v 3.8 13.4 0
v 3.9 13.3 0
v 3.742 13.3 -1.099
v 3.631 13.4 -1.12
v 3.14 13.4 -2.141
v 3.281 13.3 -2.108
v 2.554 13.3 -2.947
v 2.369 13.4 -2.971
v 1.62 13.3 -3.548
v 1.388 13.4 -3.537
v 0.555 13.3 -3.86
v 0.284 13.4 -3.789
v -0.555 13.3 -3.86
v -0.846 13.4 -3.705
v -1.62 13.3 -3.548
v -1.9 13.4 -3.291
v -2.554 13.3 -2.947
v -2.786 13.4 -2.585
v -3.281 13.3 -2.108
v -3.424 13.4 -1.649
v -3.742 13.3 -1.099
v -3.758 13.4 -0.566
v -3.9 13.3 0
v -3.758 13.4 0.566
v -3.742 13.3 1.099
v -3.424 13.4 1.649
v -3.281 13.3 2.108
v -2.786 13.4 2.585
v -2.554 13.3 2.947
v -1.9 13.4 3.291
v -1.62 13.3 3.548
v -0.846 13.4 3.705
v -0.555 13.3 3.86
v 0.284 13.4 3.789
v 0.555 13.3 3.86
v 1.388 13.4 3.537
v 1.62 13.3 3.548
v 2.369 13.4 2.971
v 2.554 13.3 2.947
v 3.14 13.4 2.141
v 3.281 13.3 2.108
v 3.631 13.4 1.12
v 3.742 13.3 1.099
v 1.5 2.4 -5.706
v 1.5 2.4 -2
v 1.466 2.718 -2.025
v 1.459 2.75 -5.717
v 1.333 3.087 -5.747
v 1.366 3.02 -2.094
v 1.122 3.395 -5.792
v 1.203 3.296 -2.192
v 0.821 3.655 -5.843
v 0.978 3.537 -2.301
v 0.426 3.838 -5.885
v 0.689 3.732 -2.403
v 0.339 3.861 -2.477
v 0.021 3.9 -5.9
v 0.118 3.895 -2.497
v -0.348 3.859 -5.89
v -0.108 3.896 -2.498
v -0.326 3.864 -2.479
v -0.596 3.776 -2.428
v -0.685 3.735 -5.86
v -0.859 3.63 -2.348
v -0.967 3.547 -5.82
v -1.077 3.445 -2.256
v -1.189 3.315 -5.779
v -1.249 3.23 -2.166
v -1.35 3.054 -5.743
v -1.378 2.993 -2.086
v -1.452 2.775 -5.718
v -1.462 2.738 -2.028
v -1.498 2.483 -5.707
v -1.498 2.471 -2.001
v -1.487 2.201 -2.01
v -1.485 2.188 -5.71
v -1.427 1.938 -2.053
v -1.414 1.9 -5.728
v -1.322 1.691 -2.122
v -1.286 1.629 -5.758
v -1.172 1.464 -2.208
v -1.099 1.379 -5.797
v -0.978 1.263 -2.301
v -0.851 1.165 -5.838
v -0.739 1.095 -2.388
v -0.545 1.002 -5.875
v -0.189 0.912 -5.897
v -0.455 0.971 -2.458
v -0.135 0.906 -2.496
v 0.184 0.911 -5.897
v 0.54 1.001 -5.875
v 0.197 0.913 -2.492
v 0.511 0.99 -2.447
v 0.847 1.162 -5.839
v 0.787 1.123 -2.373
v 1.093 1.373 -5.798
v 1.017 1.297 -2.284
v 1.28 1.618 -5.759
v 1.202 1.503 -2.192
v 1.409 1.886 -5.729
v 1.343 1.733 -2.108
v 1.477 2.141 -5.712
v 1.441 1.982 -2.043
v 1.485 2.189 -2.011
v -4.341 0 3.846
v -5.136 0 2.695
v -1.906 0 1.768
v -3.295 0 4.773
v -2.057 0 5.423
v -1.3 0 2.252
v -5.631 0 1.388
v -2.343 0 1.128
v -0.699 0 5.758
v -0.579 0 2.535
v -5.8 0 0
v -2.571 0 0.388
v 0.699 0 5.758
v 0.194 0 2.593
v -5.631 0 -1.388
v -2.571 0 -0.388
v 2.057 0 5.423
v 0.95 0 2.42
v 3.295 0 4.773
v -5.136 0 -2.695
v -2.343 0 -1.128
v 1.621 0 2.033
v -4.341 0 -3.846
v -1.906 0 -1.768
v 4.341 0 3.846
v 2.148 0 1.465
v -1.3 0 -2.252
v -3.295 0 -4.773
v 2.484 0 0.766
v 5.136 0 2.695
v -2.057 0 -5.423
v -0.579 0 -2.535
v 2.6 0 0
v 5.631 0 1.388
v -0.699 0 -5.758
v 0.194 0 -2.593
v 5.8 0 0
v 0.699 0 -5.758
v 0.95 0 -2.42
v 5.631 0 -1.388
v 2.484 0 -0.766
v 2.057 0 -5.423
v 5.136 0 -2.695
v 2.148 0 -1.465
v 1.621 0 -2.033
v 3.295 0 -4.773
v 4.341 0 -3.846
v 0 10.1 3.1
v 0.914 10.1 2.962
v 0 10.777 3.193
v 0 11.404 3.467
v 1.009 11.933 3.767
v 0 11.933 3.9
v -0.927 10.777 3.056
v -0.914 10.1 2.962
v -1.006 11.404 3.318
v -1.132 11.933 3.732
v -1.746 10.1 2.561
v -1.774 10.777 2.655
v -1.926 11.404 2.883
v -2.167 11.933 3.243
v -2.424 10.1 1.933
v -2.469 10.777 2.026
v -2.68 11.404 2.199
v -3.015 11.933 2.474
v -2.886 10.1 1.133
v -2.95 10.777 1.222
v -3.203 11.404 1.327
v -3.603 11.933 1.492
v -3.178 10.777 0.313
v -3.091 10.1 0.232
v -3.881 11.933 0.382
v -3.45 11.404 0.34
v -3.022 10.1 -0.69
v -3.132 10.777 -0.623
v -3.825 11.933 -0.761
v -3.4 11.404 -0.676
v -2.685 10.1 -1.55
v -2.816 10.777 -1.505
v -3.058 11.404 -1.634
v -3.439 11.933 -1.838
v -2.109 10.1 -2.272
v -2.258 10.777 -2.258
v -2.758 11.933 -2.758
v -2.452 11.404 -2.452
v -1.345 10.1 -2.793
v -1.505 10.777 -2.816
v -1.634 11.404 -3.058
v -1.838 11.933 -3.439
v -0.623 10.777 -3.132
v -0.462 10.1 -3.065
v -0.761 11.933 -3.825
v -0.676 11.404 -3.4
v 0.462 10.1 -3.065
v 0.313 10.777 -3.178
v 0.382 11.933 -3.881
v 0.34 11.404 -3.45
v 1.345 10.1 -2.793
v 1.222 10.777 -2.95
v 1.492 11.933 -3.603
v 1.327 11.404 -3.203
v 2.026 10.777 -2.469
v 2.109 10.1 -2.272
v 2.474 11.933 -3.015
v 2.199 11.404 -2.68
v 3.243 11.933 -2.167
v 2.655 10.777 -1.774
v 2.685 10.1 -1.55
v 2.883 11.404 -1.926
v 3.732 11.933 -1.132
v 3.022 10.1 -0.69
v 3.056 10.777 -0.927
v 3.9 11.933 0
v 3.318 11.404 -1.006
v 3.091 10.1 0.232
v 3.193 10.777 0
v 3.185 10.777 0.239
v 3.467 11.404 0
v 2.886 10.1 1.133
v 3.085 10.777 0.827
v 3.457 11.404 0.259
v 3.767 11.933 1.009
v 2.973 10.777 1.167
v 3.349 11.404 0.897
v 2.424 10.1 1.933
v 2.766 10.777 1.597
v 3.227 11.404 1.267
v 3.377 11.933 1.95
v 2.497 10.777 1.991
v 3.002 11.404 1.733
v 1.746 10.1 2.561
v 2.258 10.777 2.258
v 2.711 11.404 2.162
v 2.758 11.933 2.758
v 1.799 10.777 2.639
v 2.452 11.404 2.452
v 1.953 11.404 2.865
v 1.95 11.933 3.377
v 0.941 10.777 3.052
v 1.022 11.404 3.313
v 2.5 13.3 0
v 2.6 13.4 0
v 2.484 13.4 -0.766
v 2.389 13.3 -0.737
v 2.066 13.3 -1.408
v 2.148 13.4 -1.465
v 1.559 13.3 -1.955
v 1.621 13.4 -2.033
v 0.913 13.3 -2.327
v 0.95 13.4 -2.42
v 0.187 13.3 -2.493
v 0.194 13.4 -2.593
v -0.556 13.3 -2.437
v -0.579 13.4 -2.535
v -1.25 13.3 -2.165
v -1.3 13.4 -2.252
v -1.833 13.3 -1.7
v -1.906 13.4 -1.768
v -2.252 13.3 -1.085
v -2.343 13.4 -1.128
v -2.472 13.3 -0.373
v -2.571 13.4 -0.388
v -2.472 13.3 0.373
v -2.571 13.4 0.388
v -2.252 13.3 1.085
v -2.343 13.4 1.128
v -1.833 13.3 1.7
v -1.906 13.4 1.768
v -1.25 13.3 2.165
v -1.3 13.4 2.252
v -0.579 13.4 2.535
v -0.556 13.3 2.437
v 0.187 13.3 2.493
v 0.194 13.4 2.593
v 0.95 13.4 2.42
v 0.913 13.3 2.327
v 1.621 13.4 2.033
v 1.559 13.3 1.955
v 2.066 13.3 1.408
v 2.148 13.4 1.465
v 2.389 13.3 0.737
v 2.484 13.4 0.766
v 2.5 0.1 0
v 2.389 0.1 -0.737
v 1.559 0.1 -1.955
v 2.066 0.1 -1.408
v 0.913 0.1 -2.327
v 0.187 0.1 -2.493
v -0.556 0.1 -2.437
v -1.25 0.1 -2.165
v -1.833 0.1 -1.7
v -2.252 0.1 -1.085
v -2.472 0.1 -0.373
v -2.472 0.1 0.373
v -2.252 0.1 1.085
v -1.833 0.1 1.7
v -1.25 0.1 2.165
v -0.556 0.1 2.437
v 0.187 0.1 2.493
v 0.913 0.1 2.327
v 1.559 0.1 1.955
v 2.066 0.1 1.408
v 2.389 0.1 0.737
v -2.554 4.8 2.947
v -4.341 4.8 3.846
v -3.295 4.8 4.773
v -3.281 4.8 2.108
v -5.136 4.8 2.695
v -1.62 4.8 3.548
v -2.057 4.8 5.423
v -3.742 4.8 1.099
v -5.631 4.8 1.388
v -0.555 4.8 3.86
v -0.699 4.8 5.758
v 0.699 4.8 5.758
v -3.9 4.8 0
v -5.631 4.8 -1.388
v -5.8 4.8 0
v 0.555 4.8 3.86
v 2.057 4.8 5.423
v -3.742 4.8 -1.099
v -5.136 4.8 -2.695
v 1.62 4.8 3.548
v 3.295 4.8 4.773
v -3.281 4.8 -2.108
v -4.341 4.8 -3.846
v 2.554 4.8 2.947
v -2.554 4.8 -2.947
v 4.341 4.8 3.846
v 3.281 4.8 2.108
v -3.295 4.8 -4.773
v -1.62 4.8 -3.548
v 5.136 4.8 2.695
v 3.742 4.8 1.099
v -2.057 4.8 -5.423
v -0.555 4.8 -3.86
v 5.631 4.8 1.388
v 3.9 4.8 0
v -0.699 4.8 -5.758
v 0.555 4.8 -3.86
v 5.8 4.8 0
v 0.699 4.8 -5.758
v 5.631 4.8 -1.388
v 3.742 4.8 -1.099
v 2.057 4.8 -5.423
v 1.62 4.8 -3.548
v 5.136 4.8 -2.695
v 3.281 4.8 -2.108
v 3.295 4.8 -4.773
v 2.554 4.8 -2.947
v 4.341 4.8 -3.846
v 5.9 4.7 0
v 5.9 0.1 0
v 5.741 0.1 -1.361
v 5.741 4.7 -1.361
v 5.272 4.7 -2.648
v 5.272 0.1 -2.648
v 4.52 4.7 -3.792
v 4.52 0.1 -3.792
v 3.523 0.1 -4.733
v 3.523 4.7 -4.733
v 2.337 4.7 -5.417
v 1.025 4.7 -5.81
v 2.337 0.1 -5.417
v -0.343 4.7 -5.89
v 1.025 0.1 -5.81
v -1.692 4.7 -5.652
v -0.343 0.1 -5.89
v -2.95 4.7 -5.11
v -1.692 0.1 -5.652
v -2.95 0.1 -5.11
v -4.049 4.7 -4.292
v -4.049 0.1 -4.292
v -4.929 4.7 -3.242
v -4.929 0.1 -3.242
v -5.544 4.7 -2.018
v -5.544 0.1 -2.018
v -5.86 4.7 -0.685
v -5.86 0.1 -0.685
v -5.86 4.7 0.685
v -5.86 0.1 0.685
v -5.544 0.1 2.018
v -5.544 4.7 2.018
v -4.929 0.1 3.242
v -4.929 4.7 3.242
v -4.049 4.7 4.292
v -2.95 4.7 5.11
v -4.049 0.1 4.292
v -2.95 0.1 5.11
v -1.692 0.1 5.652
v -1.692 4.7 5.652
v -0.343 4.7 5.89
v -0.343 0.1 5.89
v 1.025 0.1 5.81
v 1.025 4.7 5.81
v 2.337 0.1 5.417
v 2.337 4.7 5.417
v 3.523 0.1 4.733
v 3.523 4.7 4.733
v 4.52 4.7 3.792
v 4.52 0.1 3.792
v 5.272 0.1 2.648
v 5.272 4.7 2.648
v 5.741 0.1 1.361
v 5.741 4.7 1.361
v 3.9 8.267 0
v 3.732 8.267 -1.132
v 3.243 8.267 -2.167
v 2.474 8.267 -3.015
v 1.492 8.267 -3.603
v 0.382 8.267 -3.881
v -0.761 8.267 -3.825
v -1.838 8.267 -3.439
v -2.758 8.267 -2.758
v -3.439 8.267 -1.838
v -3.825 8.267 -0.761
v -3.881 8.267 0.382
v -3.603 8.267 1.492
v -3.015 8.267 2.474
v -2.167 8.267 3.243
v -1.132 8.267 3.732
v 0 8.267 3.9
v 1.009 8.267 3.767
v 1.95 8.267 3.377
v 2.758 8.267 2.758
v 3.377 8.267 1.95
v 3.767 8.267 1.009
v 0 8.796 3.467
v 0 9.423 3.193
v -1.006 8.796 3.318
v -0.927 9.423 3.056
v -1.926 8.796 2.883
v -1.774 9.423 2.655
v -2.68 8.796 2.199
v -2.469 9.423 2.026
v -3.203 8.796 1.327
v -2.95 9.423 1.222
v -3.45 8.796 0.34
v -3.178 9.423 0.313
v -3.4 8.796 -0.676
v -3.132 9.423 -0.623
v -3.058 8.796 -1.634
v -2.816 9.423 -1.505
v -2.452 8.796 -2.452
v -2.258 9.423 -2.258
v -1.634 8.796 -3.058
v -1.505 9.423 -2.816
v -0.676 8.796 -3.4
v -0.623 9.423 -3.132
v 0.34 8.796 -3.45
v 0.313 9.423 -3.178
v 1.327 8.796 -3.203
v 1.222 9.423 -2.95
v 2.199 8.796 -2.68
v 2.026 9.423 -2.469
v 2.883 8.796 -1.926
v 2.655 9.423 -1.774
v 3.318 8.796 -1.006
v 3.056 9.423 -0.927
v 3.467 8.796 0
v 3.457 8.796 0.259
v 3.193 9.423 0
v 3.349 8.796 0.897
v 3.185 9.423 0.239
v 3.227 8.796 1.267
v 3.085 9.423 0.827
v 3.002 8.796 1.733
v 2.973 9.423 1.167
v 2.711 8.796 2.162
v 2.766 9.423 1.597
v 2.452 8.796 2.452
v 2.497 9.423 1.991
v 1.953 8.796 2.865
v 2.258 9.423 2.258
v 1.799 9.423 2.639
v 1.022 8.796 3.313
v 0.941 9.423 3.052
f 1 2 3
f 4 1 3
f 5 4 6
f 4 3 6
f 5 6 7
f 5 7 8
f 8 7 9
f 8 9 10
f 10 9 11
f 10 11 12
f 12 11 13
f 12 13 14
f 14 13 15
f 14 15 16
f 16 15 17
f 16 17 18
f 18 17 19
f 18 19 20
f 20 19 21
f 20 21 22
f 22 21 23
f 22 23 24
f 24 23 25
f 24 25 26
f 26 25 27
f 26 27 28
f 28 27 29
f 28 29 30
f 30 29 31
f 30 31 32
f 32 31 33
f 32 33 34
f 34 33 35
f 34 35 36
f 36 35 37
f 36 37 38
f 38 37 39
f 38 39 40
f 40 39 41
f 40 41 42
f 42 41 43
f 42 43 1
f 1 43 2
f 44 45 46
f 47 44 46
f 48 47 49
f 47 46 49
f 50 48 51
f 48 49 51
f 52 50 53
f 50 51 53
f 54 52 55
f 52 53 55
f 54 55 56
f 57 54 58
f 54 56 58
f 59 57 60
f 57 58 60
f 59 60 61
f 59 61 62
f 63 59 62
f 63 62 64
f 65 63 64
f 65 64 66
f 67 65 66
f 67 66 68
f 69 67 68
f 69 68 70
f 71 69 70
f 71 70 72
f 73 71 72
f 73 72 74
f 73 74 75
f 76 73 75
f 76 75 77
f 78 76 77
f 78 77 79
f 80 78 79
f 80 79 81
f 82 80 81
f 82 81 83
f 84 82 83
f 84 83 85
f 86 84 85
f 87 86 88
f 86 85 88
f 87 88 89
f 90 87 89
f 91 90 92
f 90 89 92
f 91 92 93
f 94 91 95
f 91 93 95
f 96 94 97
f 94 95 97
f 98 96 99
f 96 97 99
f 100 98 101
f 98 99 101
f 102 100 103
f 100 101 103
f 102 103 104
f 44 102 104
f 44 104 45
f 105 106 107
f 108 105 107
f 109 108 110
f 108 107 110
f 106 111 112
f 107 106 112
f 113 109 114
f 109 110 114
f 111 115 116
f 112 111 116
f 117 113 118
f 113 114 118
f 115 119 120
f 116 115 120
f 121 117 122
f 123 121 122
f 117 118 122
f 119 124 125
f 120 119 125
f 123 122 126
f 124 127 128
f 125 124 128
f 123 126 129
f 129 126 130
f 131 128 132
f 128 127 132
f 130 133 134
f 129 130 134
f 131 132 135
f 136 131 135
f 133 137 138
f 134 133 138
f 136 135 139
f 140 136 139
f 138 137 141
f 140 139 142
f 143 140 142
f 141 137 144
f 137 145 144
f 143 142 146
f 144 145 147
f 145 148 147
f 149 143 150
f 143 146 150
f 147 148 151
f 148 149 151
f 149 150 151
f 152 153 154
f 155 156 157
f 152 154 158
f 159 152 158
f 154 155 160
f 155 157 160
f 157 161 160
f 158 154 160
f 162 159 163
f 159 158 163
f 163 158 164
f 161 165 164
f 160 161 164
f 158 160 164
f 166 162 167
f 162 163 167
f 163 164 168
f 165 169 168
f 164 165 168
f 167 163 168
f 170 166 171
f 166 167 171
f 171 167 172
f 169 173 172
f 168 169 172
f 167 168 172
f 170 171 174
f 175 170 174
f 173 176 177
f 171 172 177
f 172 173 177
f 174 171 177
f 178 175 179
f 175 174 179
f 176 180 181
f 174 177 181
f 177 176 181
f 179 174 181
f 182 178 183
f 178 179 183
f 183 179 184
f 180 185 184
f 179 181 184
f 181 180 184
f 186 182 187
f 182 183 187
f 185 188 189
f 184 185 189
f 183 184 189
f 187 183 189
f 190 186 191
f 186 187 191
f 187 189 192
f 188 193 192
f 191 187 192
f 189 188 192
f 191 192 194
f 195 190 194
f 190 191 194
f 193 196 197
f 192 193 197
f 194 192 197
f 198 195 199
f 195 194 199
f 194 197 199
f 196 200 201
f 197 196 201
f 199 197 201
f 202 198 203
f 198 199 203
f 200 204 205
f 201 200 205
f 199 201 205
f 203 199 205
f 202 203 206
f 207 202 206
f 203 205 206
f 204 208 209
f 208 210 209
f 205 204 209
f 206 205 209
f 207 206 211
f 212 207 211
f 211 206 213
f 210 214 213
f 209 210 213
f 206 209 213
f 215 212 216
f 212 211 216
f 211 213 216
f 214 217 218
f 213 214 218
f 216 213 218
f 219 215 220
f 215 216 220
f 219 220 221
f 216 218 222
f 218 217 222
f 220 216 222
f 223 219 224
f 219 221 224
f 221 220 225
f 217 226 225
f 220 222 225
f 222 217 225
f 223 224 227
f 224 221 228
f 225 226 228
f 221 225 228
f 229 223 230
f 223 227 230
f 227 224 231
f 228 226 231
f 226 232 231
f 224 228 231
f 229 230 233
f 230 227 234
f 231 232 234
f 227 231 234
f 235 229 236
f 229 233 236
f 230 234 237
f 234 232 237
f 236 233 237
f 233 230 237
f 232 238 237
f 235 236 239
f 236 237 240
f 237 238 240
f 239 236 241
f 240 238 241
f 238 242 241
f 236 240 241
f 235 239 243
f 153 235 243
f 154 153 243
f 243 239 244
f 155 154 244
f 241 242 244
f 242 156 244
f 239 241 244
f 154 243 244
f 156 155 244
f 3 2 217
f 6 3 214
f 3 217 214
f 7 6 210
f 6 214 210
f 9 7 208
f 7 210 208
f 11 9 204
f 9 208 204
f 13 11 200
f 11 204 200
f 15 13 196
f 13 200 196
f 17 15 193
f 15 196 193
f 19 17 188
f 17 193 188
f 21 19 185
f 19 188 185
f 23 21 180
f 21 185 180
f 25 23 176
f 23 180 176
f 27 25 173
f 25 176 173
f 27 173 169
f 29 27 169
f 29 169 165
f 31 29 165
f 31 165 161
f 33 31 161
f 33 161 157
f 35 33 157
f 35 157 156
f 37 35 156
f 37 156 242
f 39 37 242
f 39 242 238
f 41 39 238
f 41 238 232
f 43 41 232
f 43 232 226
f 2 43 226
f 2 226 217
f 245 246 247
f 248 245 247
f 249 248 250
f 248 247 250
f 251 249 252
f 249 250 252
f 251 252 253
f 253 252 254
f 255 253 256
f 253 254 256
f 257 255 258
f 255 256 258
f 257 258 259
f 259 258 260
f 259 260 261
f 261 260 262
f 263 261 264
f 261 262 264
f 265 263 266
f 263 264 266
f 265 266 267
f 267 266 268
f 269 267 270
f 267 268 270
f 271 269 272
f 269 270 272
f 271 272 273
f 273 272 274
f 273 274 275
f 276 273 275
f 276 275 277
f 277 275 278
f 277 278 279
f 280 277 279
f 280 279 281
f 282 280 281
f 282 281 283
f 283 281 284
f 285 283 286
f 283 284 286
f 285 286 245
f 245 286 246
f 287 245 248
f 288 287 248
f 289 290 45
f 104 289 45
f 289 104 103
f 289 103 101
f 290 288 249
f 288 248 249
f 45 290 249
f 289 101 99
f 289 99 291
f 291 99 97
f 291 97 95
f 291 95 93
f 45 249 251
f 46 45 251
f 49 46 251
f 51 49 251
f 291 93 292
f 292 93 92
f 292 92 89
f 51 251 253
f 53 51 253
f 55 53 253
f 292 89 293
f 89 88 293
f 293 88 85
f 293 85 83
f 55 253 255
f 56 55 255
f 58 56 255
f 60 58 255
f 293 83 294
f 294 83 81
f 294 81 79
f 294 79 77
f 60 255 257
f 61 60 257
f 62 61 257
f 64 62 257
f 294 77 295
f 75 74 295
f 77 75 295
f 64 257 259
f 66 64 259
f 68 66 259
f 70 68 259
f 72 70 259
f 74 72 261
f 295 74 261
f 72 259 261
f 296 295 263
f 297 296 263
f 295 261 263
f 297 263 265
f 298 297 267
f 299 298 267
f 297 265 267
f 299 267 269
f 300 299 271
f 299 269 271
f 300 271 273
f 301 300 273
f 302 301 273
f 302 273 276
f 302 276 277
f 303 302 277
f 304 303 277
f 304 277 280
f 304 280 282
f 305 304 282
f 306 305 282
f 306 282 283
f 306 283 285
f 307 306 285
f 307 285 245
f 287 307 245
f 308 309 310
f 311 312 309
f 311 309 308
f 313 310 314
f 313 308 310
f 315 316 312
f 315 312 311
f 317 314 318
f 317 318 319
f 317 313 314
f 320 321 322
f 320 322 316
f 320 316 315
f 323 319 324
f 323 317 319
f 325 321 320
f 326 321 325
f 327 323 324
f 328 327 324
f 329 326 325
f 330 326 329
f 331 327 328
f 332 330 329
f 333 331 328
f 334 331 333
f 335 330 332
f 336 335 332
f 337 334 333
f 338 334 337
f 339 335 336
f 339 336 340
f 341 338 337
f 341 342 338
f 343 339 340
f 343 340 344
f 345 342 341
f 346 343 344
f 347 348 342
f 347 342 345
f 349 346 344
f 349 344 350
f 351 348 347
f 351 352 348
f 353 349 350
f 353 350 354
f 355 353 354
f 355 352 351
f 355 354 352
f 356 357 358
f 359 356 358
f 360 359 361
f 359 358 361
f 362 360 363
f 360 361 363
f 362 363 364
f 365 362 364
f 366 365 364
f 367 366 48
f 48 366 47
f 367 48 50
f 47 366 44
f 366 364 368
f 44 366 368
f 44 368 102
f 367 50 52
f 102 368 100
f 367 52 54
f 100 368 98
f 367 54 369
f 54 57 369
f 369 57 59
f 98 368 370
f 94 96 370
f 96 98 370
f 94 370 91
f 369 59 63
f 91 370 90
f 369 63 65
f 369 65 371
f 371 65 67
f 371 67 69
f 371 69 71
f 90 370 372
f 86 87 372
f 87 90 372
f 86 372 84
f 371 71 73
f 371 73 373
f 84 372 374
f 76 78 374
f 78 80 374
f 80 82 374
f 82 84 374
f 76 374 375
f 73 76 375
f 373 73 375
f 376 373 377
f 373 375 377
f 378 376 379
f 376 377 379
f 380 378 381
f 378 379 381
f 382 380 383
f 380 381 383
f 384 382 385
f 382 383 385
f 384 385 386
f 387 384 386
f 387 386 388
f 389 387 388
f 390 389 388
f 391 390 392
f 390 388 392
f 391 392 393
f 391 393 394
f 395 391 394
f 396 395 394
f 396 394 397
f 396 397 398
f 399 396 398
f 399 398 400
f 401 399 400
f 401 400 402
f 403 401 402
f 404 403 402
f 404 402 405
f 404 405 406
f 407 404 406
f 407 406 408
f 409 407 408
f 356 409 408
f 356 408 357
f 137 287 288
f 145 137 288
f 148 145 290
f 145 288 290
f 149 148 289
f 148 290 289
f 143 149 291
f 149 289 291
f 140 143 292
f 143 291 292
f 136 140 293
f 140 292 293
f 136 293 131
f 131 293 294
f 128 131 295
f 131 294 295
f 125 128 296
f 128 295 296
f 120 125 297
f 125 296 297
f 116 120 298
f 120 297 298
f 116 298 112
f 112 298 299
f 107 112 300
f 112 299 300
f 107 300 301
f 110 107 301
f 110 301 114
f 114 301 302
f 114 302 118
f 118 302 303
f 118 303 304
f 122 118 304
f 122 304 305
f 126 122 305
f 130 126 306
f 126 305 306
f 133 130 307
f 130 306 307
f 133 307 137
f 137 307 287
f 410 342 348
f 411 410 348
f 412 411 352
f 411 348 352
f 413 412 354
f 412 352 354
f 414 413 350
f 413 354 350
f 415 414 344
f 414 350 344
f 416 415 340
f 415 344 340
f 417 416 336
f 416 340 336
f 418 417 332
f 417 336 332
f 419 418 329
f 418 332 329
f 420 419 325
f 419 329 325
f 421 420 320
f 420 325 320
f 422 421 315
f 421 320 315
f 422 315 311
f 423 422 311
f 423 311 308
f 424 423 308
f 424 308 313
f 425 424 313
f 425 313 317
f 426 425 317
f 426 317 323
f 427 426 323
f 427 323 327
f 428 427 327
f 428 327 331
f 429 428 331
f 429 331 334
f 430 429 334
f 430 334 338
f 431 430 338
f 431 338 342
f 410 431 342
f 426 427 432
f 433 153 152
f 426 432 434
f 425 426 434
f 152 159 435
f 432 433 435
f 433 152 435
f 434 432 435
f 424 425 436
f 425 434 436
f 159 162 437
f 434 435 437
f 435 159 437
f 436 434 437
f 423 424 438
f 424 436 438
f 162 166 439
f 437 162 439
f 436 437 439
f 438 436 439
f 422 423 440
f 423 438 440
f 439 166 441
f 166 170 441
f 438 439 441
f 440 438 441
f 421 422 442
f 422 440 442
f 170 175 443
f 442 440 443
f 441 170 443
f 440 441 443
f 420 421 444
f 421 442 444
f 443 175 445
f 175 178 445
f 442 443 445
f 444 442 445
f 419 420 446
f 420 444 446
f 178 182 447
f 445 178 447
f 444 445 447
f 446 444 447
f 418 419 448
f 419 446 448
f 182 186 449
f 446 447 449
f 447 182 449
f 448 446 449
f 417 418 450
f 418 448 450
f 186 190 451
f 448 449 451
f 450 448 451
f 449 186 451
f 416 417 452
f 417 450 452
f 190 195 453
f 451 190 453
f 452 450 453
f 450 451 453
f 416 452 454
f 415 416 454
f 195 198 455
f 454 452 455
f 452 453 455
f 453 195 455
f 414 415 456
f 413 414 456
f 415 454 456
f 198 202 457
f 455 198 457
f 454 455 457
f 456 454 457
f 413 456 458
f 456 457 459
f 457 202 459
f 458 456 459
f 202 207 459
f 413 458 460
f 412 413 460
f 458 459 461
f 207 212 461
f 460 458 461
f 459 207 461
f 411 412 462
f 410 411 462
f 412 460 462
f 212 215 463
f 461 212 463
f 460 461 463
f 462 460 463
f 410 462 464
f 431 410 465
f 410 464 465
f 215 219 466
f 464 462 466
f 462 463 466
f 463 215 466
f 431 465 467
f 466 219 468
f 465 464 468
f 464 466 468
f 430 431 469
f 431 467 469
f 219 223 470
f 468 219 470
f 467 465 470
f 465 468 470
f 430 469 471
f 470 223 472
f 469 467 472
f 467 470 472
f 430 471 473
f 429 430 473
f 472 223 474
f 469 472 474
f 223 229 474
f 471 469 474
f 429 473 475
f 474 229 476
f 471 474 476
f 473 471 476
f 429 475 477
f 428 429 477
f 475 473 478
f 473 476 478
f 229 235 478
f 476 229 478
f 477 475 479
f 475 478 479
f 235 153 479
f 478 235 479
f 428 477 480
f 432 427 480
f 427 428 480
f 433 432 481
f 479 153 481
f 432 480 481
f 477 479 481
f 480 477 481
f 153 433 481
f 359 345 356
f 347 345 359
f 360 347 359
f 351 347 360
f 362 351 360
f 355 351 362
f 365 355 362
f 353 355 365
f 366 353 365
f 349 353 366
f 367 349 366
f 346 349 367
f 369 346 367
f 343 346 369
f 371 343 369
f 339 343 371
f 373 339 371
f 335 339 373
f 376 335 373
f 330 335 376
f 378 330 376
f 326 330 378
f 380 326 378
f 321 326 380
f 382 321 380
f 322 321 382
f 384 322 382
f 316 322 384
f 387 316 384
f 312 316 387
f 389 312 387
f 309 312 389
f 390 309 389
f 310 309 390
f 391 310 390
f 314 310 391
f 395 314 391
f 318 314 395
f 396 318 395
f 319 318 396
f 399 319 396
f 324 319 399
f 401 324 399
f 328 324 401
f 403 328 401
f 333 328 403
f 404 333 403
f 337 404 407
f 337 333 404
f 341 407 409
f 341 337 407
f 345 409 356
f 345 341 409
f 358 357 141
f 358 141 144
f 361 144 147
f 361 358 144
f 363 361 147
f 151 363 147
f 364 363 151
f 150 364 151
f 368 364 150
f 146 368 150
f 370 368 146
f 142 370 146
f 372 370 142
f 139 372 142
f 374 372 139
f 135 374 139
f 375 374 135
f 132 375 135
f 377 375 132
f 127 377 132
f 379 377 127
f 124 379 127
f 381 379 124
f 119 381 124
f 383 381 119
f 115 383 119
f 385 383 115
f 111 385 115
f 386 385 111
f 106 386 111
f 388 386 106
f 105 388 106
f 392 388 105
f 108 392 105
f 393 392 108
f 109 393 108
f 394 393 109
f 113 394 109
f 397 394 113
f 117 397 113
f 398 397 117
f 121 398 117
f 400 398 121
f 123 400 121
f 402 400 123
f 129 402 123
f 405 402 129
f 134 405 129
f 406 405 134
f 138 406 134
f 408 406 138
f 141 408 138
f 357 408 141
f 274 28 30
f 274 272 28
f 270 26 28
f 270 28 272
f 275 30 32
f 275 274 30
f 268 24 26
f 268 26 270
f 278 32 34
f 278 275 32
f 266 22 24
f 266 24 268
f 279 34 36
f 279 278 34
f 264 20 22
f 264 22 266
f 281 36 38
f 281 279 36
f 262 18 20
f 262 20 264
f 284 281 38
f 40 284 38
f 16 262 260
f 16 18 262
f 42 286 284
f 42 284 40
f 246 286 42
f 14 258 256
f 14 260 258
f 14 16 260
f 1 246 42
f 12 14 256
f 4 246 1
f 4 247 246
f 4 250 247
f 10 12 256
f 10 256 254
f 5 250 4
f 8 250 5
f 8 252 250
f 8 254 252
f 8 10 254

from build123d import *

# Parameters (mm, degrees)
CROQUIS1_R              = 5.9
SALIENTE_EXTRUIR1_DEPTH = 4.8
CROQUIS2_R              = 3.9
SALIENTE_EXTRUIR2_DEPTH = 13.4
CROQUIS3_R              = 2.5
CORTAR_EXTRUIR1_DEPTH   = 14.4
CHAFL_N1_SIZE           = 0.1
CROQUIS4_R              = 2.5
CROQUIS5_R              = 1.5
CORTAR_EXTRUIR2_DEPTH   = 6.9


with BuildPart() as part:
    # Croquis1 → Saliente-Extruir1 (new body)
    with BuildSketch(Plane(origin=(0, 0, 0), x_dir=(1, 0, 0), z_dir=(0, 1, 0))):
        Circle(CROQUIS1_R)
    extrude(amount=SALIENTE_EXTRUIR1_DEPTH)

    # Croquis2 → Saliente-Extruir2 (add)
    with BuildSketch(Plane(origin=(0, 0, 0), x_dir=(1, 0, 0), z_dir=(0, 1, 0))):
        Circle(CROQUIS2_R)
    extrude(amount=SALIENTE_EXTRUIR2_DEPTH)

    # Croquis3 → Cortar-Extruir1 (cut, through all)
    with BuildSketch(Plane(origin=(0, 13.4, 0), x_dir=(1, 0, 0), z_dir=(0, 1, 0))):
        Circle(CROQUIS3_R)
    extrude(amount=-CORTAR_EXTRUIR1_DEPTH, mode=Mode.SUBTRACT)

    # Chaflán1
    chafl_n1_edges = [part.edges().sort_by_distance(p)[0] for p in [
        (-2.5, 0, 0),
        (-2.5, 13.4, 0),
        (-5.9, 0, 0),
        (-5.9, 4.8, 0),
        (-3.9, 13.4, 0),
    ]]
    chamfer(chafl_n1_edges, length=CHAFL_N1_SIZE)

    # Croquis4 → Cortar-Revolución2 (revolve, cut)
    with BuildSketch(Plane(origin=(0, 0, 0), x_dir=(0, 0, -1), z_dir=(1, 0, 0))):
        with Locations((-5.6, 10.1)):
            Circle(CROQUIS4_R)
    revolve(axis=Axis((0, 13.979474026, 0), (0, -1, 0)), mode=Mode.SUBTRACT)

    # Croquis5 → Cortar-Extruir2 (cut, through all)
    with BuildSketch(Plane.XY):
        with Locations((0, 2.4)):
            Circle(CROQUIS5_R)
    extrude(amount=-CORTAR_EXTRUIR2_DEPTH, mode=Mode.SUBTRACT)


solid = part.part
